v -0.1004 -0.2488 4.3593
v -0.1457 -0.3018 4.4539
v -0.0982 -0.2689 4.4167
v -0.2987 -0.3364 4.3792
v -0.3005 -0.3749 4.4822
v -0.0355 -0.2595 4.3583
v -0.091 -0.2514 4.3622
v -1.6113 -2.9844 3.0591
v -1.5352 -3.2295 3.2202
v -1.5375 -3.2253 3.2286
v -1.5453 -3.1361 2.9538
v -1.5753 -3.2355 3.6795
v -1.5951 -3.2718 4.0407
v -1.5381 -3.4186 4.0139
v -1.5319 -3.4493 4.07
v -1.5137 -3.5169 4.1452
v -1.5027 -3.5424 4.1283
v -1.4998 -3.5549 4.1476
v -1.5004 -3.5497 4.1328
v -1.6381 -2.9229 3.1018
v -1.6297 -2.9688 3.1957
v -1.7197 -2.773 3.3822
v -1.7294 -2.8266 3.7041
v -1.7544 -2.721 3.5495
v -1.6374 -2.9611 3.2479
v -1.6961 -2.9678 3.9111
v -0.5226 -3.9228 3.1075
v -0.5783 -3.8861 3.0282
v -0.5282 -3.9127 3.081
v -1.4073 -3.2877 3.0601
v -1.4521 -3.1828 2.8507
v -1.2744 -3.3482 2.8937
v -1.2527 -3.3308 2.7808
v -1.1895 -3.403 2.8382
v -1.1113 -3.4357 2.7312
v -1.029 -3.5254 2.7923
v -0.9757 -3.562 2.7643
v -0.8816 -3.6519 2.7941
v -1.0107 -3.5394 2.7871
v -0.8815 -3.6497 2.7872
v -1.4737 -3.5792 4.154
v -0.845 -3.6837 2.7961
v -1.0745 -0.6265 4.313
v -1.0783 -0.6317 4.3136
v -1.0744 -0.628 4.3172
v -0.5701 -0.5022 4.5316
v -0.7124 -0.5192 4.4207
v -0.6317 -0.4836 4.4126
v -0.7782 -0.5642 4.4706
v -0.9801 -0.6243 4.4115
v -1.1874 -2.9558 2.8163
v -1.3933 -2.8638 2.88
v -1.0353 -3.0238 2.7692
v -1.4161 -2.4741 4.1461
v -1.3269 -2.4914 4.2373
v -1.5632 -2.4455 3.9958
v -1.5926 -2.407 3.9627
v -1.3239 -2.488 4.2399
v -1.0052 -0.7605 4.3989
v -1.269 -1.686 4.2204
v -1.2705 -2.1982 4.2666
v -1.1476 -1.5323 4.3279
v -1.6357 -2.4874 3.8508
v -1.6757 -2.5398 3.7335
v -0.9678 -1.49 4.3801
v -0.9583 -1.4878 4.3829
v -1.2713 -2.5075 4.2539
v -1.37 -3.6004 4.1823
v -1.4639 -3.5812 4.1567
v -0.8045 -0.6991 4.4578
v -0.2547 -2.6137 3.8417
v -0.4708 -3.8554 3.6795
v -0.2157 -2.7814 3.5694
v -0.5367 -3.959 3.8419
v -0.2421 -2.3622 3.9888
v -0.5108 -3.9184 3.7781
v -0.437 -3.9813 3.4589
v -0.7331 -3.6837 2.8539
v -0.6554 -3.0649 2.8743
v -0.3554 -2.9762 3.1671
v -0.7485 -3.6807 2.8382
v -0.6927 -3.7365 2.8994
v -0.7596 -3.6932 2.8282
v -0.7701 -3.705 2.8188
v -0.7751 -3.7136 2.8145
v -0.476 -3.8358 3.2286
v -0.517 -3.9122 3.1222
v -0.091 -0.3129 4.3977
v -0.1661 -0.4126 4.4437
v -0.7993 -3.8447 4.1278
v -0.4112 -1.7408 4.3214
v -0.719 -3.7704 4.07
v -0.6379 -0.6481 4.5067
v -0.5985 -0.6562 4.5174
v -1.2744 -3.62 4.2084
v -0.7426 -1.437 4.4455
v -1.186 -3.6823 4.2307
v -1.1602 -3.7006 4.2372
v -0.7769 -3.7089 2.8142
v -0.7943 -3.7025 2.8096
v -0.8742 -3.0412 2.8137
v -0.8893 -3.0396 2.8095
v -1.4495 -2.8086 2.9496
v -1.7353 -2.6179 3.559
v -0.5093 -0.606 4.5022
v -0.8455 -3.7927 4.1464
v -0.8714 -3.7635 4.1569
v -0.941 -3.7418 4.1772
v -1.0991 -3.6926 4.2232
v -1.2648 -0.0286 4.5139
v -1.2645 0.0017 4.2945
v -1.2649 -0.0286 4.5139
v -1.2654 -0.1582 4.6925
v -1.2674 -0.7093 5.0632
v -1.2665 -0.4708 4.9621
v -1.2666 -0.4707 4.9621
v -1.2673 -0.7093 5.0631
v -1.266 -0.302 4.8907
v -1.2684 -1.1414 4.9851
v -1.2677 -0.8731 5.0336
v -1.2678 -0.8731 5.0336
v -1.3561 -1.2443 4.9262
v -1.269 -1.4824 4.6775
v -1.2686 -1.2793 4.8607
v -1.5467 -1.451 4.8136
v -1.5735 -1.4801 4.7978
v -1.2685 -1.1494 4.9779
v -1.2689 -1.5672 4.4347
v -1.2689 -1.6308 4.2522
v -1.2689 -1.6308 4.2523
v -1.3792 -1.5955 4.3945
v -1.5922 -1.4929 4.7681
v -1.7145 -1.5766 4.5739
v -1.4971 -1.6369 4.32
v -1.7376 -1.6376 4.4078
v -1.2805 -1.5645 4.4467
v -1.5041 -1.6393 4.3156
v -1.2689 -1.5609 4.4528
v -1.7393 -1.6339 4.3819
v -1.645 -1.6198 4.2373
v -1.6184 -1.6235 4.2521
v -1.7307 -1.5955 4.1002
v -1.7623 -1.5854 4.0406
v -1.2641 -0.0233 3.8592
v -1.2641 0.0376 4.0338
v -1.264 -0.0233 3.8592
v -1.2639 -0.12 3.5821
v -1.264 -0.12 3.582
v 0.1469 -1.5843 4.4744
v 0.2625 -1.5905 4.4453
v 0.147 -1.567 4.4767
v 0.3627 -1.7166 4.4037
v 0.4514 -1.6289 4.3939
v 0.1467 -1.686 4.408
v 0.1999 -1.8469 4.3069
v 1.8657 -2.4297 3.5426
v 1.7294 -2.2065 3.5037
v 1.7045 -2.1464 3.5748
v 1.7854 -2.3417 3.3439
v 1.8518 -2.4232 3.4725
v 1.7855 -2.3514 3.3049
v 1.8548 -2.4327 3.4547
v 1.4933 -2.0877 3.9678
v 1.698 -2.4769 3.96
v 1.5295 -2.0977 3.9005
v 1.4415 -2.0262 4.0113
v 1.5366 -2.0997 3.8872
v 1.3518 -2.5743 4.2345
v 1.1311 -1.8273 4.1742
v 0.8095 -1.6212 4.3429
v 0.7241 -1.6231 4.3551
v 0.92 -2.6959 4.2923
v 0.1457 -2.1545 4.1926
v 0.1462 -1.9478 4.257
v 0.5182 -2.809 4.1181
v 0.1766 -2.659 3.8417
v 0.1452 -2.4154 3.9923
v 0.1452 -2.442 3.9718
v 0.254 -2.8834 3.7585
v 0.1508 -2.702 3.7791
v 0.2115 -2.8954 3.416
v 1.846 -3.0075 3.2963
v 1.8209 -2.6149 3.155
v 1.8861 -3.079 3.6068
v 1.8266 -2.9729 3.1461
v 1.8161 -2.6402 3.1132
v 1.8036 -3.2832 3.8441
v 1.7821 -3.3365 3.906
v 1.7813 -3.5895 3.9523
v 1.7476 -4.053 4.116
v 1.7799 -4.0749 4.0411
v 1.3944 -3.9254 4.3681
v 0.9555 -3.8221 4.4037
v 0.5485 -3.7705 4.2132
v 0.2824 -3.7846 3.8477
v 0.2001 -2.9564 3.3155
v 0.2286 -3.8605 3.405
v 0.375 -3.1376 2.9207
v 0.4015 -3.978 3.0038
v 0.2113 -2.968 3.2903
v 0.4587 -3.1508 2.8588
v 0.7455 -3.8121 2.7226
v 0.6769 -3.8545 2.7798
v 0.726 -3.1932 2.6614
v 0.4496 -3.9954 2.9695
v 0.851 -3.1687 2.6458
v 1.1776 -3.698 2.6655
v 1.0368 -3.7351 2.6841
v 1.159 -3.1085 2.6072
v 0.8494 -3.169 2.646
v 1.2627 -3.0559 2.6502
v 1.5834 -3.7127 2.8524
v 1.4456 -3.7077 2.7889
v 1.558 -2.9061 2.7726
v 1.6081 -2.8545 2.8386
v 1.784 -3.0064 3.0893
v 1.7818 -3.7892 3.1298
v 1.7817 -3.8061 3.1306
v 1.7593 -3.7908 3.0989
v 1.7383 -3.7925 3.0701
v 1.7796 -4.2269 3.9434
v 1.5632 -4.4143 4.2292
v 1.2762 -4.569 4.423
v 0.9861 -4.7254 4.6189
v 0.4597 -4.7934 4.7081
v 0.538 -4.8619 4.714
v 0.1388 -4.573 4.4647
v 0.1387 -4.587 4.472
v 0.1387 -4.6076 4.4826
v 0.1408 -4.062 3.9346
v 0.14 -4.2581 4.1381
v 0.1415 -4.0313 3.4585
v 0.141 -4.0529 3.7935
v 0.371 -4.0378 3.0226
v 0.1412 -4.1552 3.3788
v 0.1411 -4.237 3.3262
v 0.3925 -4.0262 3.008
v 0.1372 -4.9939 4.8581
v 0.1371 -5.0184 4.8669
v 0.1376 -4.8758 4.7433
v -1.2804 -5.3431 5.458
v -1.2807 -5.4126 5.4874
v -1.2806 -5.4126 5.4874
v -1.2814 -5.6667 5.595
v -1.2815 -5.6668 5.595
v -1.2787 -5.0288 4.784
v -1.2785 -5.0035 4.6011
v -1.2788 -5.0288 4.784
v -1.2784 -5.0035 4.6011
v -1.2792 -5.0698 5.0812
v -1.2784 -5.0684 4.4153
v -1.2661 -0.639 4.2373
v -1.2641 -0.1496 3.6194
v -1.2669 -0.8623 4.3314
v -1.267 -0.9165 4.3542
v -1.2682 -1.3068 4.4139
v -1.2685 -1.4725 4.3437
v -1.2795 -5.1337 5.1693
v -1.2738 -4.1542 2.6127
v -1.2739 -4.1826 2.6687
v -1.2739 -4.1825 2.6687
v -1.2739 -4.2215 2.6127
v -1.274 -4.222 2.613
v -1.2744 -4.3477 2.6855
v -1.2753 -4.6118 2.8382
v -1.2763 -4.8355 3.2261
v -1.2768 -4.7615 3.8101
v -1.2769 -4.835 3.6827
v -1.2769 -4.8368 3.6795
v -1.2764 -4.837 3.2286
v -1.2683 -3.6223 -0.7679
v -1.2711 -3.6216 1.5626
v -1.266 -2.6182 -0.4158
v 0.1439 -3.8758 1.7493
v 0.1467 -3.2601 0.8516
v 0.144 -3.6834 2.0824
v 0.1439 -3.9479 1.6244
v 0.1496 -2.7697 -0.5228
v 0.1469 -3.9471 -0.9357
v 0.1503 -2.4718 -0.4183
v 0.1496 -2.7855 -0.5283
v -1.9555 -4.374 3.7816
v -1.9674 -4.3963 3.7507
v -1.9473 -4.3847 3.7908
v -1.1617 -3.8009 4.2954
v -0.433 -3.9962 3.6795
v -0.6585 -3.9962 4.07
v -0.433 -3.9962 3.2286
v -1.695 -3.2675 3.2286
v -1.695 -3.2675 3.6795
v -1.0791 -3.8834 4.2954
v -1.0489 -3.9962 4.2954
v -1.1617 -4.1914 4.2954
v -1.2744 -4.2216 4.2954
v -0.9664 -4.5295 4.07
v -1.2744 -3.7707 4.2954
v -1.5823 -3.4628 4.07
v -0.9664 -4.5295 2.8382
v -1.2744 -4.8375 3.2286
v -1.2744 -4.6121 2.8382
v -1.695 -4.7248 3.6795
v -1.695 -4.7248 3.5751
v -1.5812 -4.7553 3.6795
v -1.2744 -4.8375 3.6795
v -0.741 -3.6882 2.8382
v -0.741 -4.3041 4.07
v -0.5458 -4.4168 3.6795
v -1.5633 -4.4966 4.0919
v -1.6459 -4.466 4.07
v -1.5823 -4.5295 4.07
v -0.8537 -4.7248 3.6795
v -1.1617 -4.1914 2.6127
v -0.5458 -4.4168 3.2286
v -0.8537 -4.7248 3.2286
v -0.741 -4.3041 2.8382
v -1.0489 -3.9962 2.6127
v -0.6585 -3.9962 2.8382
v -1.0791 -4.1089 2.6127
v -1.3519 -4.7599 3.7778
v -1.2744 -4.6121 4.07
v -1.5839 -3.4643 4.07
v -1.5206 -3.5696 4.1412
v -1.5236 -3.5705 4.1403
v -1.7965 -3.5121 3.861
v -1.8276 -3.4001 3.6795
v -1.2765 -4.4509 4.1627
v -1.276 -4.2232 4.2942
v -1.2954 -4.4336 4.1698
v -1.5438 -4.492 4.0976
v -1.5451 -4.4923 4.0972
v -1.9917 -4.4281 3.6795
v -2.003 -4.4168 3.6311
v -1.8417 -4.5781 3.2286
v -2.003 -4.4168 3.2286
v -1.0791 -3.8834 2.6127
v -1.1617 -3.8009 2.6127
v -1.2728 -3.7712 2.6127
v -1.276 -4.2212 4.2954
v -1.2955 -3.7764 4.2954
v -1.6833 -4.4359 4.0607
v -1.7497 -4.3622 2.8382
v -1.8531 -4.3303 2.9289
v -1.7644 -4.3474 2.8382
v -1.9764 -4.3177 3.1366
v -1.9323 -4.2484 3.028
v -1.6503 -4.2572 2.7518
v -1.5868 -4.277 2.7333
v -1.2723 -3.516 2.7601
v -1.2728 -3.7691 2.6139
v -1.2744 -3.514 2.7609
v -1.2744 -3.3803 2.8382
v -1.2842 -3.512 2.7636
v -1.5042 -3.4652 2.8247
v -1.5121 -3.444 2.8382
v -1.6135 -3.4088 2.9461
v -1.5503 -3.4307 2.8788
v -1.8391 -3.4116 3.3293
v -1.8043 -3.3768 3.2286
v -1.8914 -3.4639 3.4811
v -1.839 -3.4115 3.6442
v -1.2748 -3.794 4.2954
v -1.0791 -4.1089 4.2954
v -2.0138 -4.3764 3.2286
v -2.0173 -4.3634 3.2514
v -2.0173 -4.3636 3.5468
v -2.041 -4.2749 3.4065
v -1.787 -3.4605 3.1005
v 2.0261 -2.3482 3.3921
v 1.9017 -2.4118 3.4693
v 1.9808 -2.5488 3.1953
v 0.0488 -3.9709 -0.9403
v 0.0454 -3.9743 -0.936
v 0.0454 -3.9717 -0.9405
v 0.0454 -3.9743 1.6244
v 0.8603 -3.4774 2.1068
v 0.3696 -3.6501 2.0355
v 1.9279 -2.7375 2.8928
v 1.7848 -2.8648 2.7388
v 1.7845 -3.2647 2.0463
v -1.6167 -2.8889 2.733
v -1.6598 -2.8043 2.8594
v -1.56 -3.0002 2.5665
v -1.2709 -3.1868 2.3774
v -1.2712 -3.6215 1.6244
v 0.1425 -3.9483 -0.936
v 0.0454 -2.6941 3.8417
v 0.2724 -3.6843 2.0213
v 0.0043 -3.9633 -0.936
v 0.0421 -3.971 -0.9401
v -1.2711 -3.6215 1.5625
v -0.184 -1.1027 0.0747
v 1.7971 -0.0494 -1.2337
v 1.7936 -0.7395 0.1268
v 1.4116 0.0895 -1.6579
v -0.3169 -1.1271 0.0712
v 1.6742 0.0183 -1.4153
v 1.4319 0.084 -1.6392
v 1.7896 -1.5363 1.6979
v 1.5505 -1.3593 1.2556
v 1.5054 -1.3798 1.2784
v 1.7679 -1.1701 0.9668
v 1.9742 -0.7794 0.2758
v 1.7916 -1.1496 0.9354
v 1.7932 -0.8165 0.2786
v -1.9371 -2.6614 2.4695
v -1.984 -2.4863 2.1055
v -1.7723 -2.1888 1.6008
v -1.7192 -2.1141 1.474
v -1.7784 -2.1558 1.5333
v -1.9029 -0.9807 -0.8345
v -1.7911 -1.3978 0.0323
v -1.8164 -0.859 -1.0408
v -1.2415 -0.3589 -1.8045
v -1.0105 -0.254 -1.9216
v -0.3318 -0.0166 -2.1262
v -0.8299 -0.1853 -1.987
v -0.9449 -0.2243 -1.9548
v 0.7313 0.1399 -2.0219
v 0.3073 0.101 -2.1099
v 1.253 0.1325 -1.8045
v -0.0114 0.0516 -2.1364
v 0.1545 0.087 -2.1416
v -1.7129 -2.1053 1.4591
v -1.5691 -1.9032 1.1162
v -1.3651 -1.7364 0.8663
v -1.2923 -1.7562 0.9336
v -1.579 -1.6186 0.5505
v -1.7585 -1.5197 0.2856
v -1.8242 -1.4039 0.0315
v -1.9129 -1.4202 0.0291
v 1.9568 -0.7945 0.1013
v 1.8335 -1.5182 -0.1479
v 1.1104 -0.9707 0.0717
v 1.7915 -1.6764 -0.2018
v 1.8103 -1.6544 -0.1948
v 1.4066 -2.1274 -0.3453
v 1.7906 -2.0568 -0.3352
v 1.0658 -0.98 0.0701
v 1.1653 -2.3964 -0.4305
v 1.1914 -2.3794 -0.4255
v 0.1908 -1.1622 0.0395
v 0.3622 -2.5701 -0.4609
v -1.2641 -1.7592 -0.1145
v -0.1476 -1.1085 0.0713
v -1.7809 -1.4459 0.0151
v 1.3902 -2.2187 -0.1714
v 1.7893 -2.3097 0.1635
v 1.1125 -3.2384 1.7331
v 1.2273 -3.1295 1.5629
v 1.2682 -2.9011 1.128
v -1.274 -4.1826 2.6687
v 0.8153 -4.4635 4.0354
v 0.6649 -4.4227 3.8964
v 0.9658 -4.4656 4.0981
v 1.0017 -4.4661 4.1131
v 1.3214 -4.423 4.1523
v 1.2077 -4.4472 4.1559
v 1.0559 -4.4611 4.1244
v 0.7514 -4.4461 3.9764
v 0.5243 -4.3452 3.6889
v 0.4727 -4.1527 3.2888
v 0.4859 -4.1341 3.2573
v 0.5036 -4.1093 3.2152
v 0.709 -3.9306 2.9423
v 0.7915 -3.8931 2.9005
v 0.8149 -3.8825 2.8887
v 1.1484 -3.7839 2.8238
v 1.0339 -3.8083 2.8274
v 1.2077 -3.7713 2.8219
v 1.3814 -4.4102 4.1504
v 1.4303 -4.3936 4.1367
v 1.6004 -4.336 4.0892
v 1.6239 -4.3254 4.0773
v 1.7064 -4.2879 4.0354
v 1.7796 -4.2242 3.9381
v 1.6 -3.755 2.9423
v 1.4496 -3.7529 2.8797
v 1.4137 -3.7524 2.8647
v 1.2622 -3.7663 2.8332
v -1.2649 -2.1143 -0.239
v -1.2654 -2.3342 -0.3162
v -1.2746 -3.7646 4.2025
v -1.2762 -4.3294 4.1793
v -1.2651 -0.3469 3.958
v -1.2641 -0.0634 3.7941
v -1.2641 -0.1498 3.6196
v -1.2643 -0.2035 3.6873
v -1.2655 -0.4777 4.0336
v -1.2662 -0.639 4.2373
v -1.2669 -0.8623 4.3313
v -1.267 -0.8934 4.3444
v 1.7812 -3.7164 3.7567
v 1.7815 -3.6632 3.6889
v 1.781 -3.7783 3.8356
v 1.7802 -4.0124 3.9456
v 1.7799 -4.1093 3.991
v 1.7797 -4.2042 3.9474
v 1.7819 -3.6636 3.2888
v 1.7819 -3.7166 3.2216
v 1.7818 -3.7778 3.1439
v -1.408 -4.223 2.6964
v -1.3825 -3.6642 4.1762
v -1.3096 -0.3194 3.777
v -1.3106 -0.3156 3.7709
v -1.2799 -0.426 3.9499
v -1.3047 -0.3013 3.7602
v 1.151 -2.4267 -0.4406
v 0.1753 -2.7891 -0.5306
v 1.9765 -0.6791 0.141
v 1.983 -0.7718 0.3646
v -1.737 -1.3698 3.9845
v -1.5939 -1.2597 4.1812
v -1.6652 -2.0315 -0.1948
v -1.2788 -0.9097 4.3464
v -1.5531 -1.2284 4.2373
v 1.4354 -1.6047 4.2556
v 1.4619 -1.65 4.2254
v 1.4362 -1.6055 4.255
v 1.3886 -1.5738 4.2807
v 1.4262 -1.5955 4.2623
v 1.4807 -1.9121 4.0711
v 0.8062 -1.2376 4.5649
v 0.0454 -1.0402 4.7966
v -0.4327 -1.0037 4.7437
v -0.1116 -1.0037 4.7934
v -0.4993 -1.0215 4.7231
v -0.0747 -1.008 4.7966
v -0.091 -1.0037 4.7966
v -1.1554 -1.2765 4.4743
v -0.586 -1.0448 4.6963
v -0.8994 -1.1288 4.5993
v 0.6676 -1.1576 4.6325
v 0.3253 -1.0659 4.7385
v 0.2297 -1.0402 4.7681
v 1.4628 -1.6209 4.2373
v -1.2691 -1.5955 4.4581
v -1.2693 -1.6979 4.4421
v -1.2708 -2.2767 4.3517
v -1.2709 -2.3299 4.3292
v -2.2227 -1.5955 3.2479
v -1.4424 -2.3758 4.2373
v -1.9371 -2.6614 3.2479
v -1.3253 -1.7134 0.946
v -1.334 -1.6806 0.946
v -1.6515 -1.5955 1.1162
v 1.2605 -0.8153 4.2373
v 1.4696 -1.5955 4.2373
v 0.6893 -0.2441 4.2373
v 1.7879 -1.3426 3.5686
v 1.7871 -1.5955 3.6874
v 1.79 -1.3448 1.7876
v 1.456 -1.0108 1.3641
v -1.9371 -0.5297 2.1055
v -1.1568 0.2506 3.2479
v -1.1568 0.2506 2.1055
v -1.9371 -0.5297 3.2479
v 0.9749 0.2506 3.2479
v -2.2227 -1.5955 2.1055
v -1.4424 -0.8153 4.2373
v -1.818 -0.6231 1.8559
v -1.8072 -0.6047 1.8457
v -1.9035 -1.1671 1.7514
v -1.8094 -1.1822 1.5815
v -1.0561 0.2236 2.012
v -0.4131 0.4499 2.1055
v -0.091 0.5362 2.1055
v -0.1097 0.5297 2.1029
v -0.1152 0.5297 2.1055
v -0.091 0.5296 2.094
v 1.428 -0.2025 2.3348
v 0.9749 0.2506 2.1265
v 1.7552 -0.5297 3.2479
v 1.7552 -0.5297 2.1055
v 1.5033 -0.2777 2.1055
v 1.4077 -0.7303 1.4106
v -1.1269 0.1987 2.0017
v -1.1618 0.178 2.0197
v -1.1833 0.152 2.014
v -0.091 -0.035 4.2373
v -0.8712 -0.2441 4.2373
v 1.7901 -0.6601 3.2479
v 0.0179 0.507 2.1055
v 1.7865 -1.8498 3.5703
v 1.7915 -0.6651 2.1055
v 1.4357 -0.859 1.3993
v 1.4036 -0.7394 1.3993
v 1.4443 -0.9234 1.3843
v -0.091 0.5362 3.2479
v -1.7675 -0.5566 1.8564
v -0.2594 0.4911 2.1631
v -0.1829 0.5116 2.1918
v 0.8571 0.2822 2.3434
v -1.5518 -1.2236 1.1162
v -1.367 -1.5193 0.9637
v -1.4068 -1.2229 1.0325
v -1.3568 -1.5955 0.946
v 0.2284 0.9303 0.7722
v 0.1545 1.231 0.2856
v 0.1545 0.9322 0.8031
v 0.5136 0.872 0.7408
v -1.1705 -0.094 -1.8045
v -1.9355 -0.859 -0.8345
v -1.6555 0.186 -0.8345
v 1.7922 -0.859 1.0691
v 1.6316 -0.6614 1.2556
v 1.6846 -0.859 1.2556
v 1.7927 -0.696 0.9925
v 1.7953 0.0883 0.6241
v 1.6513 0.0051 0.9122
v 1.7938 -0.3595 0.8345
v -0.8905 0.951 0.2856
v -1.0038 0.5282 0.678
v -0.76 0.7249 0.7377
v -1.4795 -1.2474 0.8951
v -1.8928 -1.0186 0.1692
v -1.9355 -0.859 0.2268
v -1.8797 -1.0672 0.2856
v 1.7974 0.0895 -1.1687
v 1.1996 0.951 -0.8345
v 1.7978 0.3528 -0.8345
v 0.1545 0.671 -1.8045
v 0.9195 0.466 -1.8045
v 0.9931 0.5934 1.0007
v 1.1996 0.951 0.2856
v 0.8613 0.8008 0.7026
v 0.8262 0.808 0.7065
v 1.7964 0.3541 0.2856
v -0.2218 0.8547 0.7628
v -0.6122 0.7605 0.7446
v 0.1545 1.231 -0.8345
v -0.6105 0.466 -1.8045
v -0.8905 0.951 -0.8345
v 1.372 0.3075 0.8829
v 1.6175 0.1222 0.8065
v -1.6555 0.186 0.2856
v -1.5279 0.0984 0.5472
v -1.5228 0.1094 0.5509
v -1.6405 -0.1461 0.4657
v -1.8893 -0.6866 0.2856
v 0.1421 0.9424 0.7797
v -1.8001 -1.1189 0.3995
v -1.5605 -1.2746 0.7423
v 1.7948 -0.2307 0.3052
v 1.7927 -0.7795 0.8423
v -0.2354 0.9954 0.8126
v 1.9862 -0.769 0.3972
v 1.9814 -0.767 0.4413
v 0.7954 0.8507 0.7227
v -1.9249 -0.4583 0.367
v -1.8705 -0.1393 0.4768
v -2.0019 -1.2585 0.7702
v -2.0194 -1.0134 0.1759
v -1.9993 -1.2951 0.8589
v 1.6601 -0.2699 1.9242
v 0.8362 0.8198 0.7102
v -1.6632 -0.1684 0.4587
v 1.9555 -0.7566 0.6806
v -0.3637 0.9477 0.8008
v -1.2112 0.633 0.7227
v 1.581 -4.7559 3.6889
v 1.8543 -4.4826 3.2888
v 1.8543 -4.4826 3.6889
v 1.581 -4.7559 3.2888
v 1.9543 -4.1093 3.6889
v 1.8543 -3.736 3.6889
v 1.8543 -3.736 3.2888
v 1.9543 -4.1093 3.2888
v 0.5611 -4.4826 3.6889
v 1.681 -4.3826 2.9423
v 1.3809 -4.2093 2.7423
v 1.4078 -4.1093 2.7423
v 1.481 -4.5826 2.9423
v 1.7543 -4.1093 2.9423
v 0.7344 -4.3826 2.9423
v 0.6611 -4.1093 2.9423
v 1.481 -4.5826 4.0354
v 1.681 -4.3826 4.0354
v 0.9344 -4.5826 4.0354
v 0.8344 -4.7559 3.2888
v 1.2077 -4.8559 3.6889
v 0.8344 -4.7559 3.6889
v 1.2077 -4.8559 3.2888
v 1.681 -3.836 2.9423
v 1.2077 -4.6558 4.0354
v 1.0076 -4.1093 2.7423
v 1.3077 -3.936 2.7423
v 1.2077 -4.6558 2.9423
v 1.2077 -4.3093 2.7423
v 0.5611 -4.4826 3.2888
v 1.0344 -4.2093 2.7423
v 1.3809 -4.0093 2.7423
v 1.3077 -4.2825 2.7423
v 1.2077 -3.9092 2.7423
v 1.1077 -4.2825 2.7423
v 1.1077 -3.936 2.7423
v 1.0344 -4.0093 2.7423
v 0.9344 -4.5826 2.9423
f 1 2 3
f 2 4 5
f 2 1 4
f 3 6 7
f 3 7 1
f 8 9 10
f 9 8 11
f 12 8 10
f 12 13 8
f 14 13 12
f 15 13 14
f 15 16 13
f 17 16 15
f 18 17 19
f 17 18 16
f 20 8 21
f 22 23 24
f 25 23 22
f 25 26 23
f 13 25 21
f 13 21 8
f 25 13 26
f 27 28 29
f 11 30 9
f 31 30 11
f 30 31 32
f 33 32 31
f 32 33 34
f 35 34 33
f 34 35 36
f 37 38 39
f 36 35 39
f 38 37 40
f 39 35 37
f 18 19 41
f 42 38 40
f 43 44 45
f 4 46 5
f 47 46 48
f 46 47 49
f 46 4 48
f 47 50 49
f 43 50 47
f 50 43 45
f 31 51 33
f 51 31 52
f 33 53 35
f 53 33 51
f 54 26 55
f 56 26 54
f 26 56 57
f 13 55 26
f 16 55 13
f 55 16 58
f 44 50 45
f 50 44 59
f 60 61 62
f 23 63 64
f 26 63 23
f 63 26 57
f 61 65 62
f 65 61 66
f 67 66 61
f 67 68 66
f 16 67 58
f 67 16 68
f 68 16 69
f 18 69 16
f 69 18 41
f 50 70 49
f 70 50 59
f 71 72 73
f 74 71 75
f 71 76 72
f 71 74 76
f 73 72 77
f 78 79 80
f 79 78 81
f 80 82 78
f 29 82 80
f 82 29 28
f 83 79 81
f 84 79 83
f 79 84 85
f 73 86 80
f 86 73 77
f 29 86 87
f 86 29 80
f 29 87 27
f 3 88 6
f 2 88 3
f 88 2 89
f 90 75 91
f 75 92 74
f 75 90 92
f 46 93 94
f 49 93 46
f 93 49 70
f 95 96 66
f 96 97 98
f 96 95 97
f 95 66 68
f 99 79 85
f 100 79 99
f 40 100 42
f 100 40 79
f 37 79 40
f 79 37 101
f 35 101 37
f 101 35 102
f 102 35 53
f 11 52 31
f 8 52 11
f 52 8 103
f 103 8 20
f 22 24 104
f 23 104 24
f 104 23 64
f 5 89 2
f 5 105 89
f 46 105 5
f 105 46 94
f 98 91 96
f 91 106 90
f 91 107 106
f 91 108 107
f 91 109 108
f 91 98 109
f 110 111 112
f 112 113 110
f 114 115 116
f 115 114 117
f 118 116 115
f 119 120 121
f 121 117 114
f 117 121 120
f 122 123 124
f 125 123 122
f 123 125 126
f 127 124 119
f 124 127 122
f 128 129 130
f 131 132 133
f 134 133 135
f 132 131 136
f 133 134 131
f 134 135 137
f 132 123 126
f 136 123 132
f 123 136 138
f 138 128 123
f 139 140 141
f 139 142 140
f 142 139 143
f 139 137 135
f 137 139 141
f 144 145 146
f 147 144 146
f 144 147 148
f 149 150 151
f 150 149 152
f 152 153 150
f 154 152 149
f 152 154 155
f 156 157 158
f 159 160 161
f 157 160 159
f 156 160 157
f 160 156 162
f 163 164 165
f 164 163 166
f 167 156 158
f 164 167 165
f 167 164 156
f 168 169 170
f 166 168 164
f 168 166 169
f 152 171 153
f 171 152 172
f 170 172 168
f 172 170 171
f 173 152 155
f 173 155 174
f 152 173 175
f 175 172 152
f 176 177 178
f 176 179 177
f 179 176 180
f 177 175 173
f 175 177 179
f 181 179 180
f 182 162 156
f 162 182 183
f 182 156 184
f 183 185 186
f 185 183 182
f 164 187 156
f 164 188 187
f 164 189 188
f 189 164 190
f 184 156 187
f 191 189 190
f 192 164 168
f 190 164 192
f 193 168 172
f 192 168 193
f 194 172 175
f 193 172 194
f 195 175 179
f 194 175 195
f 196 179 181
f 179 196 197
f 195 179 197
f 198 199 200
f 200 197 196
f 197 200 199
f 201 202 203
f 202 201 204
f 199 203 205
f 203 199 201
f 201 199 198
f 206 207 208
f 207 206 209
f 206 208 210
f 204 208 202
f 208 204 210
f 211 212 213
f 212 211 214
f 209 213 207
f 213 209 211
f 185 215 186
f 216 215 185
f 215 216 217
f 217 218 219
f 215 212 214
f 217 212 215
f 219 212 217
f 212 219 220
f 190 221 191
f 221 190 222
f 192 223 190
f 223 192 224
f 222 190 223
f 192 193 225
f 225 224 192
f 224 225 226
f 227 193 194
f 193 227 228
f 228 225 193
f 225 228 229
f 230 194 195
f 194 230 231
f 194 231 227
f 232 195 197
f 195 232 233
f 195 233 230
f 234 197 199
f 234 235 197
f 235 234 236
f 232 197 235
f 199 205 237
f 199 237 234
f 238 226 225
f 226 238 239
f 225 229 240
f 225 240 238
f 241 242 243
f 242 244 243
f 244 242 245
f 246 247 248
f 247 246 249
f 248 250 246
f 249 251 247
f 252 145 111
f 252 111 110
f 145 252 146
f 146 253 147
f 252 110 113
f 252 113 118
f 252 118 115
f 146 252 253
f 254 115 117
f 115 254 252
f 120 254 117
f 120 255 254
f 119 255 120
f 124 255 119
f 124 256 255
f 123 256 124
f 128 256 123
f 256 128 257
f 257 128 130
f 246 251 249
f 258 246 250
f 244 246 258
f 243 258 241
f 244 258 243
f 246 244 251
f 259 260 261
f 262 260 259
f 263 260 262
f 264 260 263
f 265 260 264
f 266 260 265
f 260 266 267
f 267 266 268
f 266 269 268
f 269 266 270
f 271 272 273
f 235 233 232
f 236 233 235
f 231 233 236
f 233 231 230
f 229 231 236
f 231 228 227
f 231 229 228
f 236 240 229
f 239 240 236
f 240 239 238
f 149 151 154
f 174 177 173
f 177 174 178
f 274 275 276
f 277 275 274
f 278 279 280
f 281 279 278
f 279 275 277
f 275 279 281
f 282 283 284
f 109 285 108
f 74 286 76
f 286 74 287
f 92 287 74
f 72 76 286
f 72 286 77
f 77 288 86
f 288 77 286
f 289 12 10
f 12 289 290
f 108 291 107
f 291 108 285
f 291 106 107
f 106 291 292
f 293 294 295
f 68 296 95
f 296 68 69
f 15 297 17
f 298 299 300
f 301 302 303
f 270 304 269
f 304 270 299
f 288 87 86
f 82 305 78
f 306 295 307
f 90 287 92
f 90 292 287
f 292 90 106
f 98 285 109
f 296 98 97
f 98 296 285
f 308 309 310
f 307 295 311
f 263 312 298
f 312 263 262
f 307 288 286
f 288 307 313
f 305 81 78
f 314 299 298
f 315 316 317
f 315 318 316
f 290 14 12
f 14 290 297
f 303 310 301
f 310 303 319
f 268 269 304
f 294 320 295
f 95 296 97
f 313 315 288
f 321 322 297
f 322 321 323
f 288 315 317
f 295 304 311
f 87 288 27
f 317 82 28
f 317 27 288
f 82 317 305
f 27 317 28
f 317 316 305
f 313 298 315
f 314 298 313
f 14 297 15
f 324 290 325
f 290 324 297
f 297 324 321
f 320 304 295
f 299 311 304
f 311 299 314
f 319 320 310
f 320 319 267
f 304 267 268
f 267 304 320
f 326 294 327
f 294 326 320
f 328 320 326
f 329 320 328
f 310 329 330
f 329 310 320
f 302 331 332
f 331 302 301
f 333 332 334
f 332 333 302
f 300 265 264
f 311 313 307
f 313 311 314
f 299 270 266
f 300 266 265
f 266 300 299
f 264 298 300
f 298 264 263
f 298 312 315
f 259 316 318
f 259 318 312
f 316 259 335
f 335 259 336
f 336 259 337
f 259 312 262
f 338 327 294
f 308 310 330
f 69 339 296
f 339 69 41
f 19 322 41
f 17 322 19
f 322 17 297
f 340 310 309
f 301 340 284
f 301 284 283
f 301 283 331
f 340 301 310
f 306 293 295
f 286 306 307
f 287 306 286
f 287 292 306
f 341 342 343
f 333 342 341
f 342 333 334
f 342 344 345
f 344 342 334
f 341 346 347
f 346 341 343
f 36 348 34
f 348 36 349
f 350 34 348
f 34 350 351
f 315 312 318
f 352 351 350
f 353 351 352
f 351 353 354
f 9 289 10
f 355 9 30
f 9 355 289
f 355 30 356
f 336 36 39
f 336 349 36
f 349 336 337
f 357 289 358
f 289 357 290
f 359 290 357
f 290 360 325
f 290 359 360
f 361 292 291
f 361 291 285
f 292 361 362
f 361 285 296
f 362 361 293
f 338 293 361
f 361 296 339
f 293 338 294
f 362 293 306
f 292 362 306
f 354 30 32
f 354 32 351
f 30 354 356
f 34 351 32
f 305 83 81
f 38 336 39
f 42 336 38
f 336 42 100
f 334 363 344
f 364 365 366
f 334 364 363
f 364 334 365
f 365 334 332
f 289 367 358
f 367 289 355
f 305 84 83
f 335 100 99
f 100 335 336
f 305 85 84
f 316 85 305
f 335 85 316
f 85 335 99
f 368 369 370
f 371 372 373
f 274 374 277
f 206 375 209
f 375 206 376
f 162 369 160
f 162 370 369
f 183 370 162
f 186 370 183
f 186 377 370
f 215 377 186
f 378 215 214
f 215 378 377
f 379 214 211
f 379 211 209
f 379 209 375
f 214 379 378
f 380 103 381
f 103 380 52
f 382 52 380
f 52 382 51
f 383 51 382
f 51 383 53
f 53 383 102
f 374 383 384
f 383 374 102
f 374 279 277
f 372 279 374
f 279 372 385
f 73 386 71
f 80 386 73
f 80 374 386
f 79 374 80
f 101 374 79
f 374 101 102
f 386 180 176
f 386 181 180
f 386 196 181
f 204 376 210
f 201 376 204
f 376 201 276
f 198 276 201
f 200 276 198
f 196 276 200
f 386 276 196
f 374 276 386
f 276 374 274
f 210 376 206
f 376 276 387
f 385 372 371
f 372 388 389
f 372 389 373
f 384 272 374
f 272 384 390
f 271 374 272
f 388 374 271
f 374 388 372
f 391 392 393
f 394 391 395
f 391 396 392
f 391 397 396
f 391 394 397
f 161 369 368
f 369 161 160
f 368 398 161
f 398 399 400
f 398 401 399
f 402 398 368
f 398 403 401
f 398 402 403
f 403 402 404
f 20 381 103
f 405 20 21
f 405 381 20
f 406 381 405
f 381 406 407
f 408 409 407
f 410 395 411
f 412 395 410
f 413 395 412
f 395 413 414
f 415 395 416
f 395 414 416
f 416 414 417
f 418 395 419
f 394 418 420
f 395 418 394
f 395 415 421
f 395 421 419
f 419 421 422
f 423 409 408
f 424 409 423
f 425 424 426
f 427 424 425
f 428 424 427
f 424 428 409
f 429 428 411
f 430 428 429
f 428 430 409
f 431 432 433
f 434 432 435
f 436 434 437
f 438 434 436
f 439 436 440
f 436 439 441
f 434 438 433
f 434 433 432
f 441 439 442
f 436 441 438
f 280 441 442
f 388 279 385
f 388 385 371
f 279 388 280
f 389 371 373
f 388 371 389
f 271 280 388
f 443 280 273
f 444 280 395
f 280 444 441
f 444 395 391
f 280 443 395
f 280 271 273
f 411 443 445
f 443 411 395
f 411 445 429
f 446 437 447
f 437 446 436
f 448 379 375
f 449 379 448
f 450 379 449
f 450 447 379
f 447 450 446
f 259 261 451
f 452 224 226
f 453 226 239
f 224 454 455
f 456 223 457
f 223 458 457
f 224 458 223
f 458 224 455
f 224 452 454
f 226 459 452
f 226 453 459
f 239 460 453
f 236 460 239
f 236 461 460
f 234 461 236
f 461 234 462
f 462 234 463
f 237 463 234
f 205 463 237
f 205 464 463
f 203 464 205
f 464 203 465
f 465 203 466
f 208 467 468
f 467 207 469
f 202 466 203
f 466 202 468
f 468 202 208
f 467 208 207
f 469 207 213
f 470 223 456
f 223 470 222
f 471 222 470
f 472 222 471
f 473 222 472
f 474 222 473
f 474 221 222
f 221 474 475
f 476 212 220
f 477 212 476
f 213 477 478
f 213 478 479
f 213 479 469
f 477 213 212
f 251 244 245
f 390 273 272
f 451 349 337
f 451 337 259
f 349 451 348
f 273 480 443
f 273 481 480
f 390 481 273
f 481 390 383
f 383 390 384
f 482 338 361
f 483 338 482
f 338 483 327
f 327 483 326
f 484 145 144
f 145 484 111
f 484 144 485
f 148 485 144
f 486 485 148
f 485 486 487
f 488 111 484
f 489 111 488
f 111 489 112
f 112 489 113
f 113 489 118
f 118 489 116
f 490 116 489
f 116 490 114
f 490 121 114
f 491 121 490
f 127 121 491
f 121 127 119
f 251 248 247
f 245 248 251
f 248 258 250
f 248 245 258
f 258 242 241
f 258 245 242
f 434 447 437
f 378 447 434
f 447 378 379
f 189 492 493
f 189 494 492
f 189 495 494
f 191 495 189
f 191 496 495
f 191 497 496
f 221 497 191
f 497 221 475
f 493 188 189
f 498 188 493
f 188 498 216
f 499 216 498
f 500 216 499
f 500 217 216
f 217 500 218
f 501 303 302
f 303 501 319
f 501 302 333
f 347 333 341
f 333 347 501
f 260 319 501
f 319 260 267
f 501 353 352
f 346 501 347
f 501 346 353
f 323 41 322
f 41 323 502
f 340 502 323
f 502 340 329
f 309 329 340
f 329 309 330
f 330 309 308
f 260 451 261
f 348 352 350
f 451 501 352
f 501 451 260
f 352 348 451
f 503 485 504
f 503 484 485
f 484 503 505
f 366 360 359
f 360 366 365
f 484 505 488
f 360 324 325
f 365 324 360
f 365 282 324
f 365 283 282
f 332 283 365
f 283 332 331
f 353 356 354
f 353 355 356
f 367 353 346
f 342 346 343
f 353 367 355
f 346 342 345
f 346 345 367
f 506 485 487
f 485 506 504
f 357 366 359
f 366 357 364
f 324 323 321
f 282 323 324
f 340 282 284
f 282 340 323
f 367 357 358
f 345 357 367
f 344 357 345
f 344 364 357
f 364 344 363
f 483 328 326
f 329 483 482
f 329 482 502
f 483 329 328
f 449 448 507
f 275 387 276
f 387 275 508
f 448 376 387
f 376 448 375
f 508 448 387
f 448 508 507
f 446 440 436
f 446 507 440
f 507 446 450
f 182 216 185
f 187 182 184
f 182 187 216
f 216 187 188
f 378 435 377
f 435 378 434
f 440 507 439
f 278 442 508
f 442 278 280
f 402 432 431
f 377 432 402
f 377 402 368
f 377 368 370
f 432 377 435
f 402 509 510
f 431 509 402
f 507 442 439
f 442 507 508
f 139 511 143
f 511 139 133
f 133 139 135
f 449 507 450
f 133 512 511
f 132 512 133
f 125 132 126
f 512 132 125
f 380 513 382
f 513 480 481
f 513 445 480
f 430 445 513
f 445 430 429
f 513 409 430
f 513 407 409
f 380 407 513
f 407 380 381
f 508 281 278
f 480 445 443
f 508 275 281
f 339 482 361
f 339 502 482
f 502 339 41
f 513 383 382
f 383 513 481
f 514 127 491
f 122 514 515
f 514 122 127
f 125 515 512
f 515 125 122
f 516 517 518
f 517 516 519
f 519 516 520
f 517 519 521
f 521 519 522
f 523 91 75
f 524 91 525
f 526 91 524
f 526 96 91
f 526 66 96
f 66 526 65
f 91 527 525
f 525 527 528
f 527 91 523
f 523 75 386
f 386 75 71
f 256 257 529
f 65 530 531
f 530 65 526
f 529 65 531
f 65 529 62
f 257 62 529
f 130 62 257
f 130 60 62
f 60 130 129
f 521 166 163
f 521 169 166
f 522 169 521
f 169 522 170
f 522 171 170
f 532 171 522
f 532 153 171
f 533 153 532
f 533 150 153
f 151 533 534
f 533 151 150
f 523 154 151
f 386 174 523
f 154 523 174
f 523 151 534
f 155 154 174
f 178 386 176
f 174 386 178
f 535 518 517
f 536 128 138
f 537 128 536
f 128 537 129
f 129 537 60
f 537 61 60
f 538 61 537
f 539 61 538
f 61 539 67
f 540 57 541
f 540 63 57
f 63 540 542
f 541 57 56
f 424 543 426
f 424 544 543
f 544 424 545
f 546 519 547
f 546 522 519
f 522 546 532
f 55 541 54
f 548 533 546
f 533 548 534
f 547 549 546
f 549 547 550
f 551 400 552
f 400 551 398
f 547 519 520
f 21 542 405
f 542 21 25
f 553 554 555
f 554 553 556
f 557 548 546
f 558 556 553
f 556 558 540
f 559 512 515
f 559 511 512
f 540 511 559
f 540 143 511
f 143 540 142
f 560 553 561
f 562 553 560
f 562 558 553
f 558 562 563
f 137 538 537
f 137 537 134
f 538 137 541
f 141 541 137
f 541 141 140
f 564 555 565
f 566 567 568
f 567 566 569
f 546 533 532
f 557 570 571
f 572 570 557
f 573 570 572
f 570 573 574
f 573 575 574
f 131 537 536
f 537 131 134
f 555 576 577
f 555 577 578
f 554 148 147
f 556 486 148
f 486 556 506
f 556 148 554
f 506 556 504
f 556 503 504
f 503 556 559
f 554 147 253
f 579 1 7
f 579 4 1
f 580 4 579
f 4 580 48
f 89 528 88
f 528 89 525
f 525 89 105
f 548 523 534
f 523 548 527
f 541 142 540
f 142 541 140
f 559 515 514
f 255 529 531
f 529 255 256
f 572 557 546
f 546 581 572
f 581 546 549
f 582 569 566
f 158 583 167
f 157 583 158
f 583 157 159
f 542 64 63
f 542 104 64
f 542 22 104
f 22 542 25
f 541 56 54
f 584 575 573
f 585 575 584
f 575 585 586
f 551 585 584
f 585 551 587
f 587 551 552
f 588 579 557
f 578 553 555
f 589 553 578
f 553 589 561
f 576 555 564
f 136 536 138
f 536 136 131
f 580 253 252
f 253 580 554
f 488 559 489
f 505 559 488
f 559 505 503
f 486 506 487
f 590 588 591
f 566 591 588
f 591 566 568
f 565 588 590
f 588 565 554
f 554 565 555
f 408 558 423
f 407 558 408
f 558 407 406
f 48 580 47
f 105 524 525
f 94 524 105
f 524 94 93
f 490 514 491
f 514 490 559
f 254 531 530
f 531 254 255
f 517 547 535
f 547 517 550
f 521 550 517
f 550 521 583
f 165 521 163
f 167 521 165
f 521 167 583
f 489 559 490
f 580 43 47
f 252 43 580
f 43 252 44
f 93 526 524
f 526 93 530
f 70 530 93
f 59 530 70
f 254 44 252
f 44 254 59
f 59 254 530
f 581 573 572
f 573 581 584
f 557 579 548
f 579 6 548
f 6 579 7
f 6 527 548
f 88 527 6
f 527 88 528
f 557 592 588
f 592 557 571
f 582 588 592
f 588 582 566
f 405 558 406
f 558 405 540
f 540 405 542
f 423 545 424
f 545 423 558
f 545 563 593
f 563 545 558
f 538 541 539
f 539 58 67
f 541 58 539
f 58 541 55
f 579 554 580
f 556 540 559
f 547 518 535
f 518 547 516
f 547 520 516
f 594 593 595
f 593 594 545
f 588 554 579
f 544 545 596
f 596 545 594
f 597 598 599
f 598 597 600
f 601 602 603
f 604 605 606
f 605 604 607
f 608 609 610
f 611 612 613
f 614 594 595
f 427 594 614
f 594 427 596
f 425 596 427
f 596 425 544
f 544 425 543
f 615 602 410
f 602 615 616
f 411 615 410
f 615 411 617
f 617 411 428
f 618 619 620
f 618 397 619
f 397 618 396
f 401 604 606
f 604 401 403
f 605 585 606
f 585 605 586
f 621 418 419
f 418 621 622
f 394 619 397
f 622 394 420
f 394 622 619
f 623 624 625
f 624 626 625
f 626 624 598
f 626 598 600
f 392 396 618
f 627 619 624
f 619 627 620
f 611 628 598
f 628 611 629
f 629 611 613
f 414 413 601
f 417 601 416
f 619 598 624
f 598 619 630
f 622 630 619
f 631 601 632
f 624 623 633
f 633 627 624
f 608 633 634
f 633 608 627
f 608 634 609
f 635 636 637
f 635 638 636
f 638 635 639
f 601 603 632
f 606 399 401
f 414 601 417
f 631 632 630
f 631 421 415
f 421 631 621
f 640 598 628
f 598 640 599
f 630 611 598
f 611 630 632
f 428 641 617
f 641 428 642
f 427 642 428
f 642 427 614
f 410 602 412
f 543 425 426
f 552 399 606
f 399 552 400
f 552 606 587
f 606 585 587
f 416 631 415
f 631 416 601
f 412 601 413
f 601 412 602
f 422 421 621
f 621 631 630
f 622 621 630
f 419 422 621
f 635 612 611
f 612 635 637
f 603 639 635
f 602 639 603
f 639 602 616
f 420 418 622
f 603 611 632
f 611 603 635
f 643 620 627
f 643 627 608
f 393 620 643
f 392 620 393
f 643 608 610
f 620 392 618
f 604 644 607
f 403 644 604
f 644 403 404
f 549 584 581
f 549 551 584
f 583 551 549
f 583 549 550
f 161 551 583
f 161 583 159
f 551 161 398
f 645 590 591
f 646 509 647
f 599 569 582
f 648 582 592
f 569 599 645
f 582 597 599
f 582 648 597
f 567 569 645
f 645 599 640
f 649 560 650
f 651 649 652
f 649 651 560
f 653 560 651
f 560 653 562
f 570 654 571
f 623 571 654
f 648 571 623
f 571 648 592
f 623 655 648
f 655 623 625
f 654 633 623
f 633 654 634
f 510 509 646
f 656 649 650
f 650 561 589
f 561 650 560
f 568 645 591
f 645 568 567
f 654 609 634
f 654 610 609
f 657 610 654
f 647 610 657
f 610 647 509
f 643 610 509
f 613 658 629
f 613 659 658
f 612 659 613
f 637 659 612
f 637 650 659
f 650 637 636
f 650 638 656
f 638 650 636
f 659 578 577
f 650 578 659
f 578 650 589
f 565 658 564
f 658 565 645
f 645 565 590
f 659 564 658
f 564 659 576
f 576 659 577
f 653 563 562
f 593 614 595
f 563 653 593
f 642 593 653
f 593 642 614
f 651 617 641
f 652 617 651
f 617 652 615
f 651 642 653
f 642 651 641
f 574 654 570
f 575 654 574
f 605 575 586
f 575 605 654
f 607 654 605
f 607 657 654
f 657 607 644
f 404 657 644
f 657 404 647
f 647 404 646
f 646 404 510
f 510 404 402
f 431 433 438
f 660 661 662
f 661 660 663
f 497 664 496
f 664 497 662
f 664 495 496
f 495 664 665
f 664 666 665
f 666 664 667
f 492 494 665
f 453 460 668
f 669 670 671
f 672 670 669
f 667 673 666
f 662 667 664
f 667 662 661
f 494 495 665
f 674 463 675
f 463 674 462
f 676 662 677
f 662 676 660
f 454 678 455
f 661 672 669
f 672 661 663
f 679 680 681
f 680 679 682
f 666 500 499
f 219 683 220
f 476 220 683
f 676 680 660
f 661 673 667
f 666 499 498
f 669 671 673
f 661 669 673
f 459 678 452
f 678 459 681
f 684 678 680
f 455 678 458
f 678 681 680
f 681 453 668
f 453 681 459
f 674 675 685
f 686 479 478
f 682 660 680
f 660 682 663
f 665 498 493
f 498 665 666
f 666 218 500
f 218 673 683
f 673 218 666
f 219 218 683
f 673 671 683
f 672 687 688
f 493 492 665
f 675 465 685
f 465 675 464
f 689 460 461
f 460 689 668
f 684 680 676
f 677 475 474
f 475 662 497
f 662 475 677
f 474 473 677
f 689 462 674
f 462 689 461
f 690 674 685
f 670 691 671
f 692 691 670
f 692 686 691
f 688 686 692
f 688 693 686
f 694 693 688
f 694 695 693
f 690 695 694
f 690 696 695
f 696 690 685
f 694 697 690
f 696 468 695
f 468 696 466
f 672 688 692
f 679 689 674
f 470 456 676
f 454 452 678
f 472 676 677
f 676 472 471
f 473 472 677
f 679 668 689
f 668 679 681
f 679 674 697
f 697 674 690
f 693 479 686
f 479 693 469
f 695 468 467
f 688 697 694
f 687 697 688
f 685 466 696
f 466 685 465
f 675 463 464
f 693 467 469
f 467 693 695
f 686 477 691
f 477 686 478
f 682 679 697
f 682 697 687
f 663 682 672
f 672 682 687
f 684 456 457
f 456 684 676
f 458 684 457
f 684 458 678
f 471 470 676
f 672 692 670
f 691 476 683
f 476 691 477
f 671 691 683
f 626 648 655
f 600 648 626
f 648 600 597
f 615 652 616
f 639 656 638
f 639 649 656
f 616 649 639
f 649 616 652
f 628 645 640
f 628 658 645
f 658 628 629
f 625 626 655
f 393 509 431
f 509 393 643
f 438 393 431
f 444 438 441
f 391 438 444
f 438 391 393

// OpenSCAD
// Begin.
union() {
difference() {
union() {
union() {
intersection() {
rotate([0, -70.564, -83.8064])
translate([9.7143, -0.126678, -0.790822])
rotate([0, 90, 0])
cylinder(h = 18.5714, r1 = 2.01835, r2 = 2.01835, center = true, $fn = 12);

rotate([0, -5.17169, 79.5476])
translate([0, 0.469549, 3.80492])
rotate([0, 90, 0])
cylinder(h = 38, r1 = 0.76206, r2 = 0.76206, center = true, $fn = 12);
}

difference() {
translate([-1.30428, -3.3221, 4.42402])
rotate([0, -67.6522, 15.7235])
rotate([0, 90, 0])
rotate_extrude($fn = 12)
translate([2.6242, 0, 0])
circle(r = 0.87387, $fn = 12);

rotate([-0, -0.068182, -0.155845])
translate([-0.551403, 0, 0])
cube(size = [1.4159, 38, 38], center = true);
}
}

intersection() {
union() {
translate([-1.27438, -3.99616, 3.45406])
sphere(r = 0.87101, $fn = 12);

translate([0.04541, 0.80336, 0.34418])
sphere(r = 4.9462, $fn = 12);
}

difference() {
rotate([-153.567, 0, 11.1447])
translate([0, 9.95183, 0])
cube(size = [38, 18.0963, 38], center = true);

rotate([-160.564, 0, 6.19356])
translate([0, 0, 9.2857])
cube(size = [38, 38, 19.4286], center = true);
}
}
}

difference() {
union() {
union() {
rotate([-153.567, 0, 11.1447])
translate([0, 10.6331, 0])
cube(size = [38, 16.7338, 38], center = true);

rotate([-0, -0.068182, -0.155845])
translate([-10.1297, 0, 0])
cube(size = [17.7406, 38, 38], center = true);
}

rotate([-0, -0.068182, -0.155845])
translate([10.3979, 0, 0])
cube(size = [17.2042, 38, 38], center = true);
}

union() {
intersection() {
rotate([-153.567, 0, 11.1447])
translate([0, -8.36688, 0])
cube(size = [38, 21.2662, 38], center = true);

rotate([0, -5.17169, 79.5476])
translate([0, 0.469549, 3.80492])
rotate([0, 90, 0])
cylinder(h = 38, r1 = 0.76206, r2 = 0.76206, center = true, $fn = 12);
}

union() {
rotate([-0, -0.068182, -0.155845])
translate([-0.551403, 0, 0])
cube(size = [1.4159, 38, 38], center = true);

rotate([0, -70.564, -83.8064])
translate([9.7143, -0.126678, -0.790822])
rotate([0, 90, 0])
cylinder(h = 18.5714, r1 = 2.01835, r2 = 2.01835, center = true, $fn = 12);
}
}
}
}

union() {
intersection() {
intersection() {
union() {
translate([0.04541, 0.80336, 0.34418])
sphere(r = 4.9462, $fn = 12);

rotate([-0, -0.068182, -0.155845])
translate([-10.1297, 0, 0])
cube(size = [17.7406, 38, 38], center = true);
}

union() {
translate([-0.09096, -1.59554, 2.67673])
sphere(r = 2.20695, $fn = 12);

translate([0.15454, -0.85904, -0.27445])
sphere(r = 2.16377, $fn = 12);
}
}

difference() {
rotate([-0, -0.068182, -0.155845])
translate([-8.60211, 0, 0])
cube(size = [20.7958, 38, 38], center = true);

rotate([-153.567, 0, 11.1447])
translate([0, 9.95183, 0])
cube(size = [38, 18.0963, 38], center = true);
}
}

intersection() {
rotate([-160.564, 0, 6.19356])
translate([0, 0, -9.7143])
cube(size = [38, 38, 18.5714], center = true);

union() {
intersection() {
rotate([0, -70.564, -83.8064])
translate([9.7143, -0.126678, -0.790822])
rotate([0, 90, 0])
cylinder(h = 18.5714, r1 = 2.01835, r2 = 2.01835, center = true, $fn = 12);

translate([-2.10784, 2.61544, -2.50246])
rotate([0, 7.34194, -89.2836])
rotate([0, 90, 0])
rotate_extrude($fn = 12)
translate([3.84969, 0, 0])
circle(r = 3.45, $fn = 12);
}

intersection() {
translate([1.2077, -4.10928, 3.48889])
sphere(r = 0.77294, $fn = 12);

rotate([-153.567, 0, 11.1447])
translate([0, 9.95183, 0])
cube(size = [38, 18.0963, 38], center = true);
}
}
}
}
}
// End.
